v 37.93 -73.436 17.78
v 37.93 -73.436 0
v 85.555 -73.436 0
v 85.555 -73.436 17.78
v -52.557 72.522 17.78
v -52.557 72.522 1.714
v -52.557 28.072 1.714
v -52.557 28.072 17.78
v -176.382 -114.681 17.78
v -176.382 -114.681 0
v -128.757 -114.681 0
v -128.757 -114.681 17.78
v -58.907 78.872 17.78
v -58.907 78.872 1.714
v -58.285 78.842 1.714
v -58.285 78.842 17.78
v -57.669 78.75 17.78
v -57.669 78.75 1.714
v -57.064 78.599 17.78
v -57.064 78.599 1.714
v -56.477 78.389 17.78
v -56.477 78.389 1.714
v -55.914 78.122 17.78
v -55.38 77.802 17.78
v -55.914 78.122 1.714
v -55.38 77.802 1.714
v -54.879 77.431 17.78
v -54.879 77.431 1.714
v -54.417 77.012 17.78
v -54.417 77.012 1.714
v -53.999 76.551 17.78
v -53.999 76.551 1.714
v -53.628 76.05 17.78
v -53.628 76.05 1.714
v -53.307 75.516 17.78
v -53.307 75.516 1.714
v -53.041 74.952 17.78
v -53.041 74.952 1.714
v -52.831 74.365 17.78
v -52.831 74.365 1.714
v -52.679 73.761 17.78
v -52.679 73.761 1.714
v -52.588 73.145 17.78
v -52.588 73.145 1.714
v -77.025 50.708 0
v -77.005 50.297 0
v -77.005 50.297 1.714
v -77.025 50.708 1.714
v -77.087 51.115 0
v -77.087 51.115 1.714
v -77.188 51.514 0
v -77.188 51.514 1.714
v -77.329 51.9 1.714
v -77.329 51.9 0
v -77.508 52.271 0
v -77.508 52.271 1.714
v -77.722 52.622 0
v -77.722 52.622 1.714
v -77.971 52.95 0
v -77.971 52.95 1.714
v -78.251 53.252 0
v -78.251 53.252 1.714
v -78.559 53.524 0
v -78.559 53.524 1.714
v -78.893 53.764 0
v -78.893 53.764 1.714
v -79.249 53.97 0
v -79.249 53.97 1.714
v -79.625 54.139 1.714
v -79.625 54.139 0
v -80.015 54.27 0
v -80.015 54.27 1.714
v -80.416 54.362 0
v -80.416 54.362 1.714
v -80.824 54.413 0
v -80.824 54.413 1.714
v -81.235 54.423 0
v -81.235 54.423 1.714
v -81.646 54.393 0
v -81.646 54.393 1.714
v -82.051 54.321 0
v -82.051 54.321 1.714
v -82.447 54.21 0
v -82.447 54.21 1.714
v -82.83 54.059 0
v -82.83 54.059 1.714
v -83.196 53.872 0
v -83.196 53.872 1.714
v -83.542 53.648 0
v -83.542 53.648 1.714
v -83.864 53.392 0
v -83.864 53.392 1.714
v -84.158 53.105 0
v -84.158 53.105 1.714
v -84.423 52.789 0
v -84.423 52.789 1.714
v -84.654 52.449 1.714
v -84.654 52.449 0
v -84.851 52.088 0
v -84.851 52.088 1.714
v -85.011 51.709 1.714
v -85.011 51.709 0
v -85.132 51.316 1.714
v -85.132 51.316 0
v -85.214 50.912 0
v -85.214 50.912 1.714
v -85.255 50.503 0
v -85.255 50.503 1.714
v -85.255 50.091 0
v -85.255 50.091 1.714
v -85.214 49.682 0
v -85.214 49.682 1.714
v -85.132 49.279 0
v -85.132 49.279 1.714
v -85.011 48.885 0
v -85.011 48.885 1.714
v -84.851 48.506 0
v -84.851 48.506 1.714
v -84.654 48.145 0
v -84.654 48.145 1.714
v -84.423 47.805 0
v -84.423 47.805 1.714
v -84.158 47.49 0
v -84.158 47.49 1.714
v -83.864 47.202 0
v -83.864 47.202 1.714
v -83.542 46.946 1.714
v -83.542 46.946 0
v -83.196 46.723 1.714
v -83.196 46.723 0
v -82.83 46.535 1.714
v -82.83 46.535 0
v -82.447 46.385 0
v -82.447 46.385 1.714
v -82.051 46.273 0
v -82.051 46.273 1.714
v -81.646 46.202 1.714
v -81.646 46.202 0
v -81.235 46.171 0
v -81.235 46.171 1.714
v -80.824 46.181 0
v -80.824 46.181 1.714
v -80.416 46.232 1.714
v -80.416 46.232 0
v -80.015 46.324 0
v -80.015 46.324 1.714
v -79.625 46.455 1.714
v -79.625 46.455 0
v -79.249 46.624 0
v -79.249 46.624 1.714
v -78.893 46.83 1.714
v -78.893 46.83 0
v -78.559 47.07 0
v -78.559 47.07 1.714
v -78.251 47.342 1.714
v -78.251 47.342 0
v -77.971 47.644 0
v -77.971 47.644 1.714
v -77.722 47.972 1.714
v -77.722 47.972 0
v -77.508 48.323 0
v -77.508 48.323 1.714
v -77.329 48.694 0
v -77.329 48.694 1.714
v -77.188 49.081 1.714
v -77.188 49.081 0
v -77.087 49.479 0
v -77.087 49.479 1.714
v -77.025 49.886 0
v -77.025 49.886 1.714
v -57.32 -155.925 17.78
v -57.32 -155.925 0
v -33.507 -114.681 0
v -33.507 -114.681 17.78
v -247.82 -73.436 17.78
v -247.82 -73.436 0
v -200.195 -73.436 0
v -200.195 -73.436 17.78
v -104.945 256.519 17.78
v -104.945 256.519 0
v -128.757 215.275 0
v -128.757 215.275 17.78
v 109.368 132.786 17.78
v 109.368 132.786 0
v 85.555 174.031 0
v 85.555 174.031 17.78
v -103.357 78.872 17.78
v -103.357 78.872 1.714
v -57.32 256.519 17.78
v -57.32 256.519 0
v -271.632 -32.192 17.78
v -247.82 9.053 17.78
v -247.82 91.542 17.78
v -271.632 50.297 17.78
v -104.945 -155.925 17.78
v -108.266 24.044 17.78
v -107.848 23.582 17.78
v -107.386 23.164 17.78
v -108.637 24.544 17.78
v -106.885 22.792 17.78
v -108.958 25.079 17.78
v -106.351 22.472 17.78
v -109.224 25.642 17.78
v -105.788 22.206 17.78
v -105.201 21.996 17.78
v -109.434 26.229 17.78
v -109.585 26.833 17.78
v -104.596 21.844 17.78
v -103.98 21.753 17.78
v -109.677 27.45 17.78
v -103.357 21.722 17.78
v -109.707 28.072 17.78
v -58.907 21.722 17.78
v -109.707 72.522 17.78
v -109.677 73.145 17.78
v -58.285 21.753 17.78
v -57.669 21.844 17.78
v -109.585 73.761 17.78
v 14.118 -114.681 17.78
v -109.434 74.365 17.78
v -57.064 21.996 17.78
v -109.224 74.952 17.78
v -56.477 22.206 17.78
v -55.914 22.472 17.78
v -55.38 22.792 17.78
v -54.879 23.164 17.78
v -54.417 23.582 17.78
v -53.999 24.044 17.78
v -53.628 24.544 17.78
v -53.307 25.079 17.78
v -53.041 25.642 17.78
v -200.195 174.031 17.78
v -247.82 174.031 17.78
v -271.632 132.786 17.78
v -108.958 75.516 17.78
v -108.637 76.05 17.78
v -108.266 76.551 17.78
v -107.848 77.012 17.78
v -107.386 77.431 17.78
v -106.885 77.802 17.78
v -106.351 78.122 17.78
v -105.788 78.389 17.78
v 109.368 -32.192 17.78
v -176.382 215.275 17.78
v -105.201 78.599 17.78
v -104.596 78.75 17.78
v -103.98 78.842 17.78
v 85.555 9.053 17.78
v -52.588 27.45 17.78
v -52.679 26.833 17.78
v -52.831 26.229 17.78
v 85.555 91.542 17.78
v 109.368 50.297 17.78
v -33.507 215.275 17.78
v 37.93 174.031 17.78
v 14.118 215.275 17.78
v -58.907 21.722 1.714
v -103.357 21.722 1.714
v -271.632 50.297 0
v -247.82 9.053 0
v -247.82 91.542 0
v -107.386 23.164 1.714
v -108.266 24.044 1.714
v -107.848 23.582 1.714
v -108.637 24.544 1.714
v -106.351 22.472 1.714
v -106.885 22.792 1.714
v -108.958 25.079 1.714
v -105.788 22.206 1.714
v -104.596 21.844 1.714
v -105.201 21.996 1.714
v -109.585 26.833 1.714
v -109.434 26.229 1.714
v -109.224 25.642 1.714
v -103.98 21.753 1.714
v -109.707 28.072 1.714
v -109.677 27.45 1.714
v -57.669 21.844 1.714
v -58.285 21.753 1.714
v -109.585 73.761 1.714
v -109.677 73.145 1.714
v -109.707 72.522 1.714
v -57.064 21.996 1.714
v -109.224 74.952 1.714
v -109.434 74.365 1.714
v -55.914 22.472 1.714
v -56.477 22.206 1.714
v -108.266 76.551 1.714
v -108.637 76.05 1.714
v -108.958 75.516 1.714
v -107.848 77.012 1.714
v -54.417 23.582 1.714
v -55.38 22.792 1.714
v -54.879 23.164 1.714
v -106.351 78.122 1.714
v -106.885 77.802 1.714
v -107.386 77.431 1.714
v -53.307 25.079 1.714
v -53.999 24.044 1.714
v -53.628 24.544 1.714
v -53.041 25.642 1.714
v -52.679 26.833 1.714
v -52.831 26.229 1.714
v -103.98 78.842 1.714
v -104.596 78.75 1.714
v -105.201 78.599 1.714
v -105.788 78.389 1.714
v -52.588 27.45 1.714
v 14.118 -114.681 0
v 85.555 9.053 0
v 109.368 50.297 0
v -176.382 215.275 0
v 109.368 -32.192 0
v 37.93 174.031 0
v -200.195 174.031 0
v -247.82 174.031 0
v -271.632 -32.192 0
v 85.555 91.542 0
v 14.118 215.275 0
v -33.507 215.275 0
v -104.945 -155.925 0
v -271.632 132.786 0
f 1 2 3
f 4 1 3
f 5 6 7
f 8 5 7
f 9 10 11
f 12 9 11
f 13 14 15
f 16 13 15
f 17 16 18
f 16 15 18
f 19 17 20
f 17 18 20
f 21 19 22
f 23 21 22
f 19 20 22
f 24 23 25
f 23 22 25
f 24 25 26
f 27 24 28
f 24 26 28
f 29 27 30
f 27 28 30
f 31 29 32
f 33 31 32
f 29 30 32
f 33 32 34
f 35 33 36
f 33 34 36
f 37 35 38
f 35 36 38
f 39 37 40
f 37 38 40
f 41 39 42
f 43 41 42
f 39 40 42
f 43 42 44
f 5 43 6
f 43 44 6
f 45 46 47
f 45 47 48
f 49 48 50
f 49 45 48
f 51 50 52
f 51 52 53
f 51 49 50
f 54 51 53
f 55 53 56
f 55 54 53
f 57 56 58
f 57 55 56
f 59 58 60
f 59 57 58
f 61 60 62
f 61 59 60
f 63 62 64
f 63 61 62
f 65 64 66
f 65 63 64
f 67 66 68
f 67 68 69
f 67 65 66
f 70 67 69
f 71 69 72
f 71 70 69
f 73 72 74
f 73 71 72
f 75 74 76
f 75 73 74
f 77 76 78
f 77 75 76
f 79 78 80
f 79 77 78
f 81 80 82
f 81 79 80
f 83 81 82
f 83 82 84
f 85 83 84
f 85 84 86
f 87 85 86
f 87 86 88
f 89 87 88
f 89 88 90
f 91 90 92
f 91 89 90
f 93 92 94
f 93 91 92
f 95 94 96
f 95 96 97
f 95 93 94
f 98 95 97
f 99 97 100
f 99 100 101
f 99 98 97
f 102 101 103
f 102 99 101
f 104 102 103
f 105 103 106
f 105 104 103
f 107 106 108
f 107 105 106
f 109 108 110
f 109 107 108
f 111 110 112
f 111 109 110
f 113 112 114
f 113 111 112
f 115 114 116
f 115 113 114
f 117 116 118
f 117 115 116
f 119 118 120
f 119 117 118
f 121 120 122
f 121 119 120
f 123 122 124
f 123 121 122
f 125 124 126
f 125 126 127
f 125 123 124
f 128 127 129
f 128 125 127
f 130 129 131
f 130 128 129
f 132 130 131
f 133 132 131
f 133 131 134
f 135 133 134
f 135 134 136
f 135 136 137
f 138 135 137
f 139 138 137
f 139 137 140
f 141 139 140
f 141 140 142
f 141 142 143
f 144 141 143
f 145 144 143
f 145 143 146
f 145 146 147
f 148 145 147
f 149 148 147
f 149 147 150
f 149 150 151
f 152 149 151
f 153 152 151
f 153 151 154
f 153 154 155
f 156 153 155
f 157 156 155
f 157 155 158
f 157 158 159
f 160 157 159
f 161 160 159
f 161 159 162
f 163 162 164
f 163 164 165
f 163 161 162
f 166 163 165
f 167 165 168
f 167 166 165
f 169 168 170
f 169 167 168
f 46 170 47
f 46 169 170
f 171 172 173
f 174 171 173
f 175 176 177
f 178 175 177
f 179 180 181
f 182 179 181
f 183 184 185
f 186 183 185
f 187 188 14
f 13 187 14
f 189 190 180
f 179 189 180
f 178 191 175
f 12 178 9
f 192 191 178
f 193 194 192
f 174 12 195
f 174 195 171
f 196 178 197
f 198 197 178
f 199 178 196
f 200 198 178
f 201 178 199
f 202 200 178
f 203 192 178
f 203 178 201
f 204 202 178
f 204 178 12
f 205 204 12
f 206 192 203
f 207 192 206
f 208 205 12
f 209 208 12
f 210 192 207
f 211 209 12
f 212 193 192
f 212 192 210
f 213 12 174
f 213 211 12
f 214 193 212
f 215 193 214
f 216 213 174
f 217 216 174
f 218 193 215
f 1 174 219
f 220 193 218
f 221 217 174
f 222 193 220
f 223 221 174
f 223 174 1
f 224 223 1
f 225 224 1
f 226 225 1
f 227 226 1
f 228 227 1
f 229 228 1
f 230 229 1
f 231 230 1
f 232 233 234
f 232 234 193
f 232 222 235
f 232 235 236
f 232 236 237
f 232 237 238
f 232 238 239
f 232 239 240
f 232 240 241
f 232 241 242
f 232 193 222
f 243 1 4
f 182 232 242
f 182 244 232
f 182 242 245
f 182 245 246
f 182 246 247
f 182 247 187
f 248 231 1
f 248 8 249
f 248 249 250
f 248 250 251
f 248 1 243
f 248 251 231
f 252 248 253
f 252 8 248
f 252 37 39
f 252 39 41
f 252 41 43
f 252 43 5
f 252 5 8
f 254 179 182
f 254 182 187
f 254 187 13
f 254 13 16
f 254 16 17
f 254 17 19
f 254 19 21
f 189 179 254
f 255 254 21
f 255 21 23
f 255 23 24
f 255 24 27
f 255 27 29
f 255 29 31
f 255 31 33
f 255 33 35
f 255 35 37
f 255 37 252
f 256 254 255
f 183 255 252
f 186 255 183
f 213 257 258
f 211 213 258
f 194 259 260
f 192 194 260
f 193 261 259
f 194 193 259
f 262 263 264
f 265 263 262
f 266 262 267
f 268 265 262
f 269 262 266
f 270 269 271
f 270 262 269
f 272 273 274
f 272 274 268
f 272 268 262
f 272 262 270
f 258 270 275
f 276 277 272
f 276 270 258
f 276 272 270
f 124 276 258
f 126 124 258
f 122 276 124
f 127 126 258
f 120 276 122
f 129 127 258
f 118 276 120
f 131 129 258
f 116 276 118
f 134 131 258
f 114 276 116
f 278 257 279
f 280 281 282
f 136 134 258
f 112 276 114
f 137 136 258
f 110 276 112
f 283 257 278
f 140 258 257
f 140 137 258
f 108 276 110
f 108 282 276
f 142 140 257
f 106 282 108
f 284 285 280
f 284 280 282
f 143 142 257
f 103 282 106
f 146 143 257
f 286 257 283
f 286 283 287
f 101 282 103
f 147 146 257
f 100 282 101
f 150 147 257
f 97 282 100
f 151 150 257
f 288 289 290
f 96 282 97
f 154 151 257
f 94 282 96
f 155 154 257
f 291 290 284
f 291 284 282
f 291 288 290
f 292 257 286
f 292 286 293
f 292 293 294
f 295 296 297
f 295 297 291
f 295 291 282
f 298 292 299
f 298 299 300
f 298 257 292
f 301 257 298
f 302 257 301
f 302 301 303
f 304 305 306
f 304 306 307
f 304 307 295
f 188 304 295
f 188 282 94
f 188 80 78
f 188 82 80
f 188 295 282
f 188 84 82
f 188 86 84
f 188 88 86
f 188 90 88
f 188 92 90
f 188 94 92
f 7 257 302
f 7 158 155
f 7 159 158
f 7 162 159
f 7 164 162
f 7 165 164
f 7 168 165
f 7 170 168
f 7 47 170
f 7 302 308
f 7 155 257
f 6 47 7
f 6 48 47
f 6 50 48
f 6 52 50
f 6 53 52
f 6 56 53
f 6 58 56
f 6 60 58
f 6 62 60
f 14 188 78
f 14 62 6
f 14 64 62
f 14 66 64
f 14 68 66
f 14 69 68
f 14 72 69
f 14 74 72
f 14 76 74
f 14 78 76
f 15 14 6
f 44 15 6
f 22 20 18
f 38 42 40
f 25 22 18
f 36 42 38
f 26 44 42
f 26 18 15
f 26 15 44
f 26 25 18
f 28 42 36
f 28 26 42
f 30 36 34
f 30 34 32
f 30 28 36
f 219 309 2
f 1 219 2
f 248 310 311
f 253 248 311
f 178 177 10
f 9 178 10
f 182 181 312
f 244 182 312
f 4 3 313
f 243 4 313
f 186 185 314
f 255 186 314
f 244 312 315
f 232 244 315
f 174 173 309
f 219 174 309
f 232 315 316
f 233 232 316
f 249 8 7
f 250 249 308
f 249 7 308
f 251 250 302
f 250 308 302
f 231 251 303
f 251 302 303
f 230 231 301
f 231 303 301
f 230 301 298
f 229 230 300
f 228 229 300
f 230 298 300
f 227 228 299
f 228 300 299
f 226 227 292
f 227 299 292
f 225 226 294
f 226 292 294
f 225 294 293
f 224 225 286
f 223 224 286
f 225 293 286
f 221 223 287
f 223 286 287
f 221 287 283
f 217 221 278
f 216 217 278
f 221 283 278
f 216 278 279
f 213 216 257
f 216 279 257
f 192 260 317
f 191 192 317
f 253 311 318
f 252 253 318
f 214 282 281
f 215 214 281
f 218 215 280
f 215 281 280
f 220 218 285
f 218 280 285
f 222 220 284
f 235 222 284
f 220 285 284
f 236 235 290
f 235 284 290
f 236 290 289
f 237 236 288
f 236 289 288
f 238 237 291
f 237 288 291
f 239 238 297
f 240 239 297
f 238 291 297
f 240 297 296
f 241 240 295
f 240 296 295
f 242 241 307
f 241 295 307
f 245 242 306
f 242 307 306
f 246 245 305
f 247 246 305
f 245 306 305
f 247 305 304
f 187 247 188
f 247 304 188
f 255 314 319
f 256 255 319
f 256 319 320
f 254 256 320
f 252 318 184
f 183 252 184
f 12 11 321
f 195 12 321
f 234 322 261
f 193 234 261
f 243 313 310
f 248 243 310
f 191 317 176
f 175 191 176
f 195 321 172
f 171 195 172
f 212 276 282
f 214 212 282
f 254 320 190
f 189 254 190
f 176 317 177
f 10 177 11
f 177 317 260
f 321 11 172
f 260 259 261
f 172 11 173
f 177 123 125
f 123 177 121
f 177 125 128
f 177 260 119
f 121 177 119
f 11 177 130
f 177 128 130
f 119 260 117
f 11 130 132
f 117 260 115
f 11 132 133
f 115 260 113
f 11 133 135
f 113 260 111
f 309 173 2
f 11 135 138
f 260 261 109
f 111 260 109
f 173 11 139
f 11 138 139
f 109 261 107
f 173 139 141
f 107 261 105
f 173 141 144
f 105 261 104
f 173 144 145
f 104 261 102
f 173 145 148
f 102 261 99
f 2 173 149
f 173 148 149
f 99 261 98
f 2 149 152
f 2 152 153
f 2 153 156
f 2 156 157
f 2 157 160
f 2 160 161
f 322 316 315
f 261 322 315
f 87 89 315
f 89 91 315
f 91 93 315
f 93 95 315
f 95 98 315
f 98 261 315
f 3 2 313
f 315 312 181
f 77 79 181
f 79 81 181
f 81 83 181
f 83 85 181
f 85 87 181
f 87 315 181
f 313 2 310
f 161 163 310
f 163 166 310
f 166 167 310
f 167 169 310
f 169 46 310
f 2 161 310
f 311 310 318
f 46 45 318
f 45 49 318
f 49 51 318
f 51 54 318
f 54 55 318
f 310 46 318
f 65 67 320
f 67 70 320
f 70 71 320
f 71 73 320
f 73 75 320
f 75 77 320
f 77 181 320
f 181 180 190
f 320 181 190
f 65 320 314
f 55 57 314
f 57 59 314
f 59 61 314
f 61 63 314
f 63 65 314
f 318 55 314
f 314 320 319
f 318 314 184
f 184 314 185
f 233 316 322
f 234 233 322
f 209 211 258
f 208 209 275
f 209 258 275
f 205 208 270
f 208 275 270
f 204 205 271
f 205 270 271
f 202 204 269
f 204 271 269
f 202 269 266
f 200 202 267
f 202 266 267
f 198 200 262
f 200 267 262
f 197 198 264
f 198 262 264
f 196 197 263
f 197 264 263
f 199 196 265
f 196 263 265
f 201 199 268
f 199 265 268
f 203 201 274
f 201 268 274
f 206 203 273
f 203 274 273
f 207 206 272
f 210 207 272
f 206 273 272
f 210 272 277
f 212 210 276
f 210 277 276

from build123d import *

# Parameters (mm, degrees)
F2_DEPTH = 17.78
F1_R     = 4.1275
F3_DEPTH = 1.7145


with BuildPart() as f2:
    # F1 (on Top) → F2 (new body)
    with BuildSketch(Plane.XY):
        Polygon((-271.632484, 50.297177), (-247.819984, 9.052717), (-271.632484, -32.191743), (-247.819984, -73.436203), (-200.194984, -73.436203), (-176.382484, -114.680663), (-128.757484, -114.680663), (-104.944984, -155.925123), (-57.319984, -155.925123), (-33.507484, -114.680663), (14.117516, -114.680663), (37.930016, -73.436203), (85.555016, -73.436203), (109.367516, -32.191743), (85.555016, 9.052717), (109.367516, 50.297177), (85.555016, 91.541636), (109.367516, 132.786096), (85.555016, 174.030556), (37.930016, 174.030556), (14.117516, 215.275016), (-33.507484, 215.275016), (-57.319984, 256.519476), (-104.944984, 256.519476), (-128.757484, 215.275016), (-176.382484, 215.275016), (-200.194984, 174.030556), (-247.819984, 174.030556), (-271.632484, 132.786096), (-247.819984, 91.541636), align=None)
        with BuildLine():
            ThreePointArc((-109.707484, 72.522177), (-107.847612, 77.012305), (-103.357484, 78.872177))
            Line((-103.357484, 78.872177), (-58.907484, 78.872177))
            ThreePointArc((-58.907484, 78.872177), (-54.417356, 77.012305), (-52.557484, 72.522177))
            Line((-52.557484, 72.522177), (-52.557484, 28.072177))
            ThreePointArc((-52.557484, 28.072177), (-54.417356, 23.582049), (-58.907484, 21.722177))
            Line((-58.907484, 21.722177), (-103.357484, 21.722177))
            ThreePointArc((-103.357484, 21.722177), (-107.847612, 23.582049), (-109.707484, 28.072177))
            Line((-109.707484, 28.072177), (-109.707484, 72.522177))
        make_face(mode=Mode.SUBTRACT)
    extrude(amount=F2_DEPTH)

    # F1 (on Top) → F3 (join)
    with BuildSketch(Plane.XY):
        with BuildLine():
            Line((-58.907484, 78.872177), (-103.357484, 78.872177))
            ThreePointArc((-103.357484, 78.872177), (-107.847612, 77.012305), (-109.707484, 72.522177))
            Line((-109.707484, 72.522177), (-109.707484, 28.072177))
            ThreePointArc((-109.707484, 28.072177), (-107.847612, 23.582049), (-103.357484, 21.722177))
            Line((-103.357484, 21.722177), (-58.907484, 21.722177))
            ThreePointArc((-58.907484, 21.722177), (-54.417356, 23.582049), (-52.557484, 28.072177))
            Line((-52.557484, 28.072177), (-52.557484, 72.522177))
            ThreePointArc((-52.557484, 72.522177), (-54.417356, 77.012305), (-58.907484, 78.872177))
        make_face()
        with Locations((-81.132484, 50.297177)):
            Circle(F1_R, mode=Mode.SUBTRACT)
    extrude(amount=F3_DEPTH)


solid = f2.part
